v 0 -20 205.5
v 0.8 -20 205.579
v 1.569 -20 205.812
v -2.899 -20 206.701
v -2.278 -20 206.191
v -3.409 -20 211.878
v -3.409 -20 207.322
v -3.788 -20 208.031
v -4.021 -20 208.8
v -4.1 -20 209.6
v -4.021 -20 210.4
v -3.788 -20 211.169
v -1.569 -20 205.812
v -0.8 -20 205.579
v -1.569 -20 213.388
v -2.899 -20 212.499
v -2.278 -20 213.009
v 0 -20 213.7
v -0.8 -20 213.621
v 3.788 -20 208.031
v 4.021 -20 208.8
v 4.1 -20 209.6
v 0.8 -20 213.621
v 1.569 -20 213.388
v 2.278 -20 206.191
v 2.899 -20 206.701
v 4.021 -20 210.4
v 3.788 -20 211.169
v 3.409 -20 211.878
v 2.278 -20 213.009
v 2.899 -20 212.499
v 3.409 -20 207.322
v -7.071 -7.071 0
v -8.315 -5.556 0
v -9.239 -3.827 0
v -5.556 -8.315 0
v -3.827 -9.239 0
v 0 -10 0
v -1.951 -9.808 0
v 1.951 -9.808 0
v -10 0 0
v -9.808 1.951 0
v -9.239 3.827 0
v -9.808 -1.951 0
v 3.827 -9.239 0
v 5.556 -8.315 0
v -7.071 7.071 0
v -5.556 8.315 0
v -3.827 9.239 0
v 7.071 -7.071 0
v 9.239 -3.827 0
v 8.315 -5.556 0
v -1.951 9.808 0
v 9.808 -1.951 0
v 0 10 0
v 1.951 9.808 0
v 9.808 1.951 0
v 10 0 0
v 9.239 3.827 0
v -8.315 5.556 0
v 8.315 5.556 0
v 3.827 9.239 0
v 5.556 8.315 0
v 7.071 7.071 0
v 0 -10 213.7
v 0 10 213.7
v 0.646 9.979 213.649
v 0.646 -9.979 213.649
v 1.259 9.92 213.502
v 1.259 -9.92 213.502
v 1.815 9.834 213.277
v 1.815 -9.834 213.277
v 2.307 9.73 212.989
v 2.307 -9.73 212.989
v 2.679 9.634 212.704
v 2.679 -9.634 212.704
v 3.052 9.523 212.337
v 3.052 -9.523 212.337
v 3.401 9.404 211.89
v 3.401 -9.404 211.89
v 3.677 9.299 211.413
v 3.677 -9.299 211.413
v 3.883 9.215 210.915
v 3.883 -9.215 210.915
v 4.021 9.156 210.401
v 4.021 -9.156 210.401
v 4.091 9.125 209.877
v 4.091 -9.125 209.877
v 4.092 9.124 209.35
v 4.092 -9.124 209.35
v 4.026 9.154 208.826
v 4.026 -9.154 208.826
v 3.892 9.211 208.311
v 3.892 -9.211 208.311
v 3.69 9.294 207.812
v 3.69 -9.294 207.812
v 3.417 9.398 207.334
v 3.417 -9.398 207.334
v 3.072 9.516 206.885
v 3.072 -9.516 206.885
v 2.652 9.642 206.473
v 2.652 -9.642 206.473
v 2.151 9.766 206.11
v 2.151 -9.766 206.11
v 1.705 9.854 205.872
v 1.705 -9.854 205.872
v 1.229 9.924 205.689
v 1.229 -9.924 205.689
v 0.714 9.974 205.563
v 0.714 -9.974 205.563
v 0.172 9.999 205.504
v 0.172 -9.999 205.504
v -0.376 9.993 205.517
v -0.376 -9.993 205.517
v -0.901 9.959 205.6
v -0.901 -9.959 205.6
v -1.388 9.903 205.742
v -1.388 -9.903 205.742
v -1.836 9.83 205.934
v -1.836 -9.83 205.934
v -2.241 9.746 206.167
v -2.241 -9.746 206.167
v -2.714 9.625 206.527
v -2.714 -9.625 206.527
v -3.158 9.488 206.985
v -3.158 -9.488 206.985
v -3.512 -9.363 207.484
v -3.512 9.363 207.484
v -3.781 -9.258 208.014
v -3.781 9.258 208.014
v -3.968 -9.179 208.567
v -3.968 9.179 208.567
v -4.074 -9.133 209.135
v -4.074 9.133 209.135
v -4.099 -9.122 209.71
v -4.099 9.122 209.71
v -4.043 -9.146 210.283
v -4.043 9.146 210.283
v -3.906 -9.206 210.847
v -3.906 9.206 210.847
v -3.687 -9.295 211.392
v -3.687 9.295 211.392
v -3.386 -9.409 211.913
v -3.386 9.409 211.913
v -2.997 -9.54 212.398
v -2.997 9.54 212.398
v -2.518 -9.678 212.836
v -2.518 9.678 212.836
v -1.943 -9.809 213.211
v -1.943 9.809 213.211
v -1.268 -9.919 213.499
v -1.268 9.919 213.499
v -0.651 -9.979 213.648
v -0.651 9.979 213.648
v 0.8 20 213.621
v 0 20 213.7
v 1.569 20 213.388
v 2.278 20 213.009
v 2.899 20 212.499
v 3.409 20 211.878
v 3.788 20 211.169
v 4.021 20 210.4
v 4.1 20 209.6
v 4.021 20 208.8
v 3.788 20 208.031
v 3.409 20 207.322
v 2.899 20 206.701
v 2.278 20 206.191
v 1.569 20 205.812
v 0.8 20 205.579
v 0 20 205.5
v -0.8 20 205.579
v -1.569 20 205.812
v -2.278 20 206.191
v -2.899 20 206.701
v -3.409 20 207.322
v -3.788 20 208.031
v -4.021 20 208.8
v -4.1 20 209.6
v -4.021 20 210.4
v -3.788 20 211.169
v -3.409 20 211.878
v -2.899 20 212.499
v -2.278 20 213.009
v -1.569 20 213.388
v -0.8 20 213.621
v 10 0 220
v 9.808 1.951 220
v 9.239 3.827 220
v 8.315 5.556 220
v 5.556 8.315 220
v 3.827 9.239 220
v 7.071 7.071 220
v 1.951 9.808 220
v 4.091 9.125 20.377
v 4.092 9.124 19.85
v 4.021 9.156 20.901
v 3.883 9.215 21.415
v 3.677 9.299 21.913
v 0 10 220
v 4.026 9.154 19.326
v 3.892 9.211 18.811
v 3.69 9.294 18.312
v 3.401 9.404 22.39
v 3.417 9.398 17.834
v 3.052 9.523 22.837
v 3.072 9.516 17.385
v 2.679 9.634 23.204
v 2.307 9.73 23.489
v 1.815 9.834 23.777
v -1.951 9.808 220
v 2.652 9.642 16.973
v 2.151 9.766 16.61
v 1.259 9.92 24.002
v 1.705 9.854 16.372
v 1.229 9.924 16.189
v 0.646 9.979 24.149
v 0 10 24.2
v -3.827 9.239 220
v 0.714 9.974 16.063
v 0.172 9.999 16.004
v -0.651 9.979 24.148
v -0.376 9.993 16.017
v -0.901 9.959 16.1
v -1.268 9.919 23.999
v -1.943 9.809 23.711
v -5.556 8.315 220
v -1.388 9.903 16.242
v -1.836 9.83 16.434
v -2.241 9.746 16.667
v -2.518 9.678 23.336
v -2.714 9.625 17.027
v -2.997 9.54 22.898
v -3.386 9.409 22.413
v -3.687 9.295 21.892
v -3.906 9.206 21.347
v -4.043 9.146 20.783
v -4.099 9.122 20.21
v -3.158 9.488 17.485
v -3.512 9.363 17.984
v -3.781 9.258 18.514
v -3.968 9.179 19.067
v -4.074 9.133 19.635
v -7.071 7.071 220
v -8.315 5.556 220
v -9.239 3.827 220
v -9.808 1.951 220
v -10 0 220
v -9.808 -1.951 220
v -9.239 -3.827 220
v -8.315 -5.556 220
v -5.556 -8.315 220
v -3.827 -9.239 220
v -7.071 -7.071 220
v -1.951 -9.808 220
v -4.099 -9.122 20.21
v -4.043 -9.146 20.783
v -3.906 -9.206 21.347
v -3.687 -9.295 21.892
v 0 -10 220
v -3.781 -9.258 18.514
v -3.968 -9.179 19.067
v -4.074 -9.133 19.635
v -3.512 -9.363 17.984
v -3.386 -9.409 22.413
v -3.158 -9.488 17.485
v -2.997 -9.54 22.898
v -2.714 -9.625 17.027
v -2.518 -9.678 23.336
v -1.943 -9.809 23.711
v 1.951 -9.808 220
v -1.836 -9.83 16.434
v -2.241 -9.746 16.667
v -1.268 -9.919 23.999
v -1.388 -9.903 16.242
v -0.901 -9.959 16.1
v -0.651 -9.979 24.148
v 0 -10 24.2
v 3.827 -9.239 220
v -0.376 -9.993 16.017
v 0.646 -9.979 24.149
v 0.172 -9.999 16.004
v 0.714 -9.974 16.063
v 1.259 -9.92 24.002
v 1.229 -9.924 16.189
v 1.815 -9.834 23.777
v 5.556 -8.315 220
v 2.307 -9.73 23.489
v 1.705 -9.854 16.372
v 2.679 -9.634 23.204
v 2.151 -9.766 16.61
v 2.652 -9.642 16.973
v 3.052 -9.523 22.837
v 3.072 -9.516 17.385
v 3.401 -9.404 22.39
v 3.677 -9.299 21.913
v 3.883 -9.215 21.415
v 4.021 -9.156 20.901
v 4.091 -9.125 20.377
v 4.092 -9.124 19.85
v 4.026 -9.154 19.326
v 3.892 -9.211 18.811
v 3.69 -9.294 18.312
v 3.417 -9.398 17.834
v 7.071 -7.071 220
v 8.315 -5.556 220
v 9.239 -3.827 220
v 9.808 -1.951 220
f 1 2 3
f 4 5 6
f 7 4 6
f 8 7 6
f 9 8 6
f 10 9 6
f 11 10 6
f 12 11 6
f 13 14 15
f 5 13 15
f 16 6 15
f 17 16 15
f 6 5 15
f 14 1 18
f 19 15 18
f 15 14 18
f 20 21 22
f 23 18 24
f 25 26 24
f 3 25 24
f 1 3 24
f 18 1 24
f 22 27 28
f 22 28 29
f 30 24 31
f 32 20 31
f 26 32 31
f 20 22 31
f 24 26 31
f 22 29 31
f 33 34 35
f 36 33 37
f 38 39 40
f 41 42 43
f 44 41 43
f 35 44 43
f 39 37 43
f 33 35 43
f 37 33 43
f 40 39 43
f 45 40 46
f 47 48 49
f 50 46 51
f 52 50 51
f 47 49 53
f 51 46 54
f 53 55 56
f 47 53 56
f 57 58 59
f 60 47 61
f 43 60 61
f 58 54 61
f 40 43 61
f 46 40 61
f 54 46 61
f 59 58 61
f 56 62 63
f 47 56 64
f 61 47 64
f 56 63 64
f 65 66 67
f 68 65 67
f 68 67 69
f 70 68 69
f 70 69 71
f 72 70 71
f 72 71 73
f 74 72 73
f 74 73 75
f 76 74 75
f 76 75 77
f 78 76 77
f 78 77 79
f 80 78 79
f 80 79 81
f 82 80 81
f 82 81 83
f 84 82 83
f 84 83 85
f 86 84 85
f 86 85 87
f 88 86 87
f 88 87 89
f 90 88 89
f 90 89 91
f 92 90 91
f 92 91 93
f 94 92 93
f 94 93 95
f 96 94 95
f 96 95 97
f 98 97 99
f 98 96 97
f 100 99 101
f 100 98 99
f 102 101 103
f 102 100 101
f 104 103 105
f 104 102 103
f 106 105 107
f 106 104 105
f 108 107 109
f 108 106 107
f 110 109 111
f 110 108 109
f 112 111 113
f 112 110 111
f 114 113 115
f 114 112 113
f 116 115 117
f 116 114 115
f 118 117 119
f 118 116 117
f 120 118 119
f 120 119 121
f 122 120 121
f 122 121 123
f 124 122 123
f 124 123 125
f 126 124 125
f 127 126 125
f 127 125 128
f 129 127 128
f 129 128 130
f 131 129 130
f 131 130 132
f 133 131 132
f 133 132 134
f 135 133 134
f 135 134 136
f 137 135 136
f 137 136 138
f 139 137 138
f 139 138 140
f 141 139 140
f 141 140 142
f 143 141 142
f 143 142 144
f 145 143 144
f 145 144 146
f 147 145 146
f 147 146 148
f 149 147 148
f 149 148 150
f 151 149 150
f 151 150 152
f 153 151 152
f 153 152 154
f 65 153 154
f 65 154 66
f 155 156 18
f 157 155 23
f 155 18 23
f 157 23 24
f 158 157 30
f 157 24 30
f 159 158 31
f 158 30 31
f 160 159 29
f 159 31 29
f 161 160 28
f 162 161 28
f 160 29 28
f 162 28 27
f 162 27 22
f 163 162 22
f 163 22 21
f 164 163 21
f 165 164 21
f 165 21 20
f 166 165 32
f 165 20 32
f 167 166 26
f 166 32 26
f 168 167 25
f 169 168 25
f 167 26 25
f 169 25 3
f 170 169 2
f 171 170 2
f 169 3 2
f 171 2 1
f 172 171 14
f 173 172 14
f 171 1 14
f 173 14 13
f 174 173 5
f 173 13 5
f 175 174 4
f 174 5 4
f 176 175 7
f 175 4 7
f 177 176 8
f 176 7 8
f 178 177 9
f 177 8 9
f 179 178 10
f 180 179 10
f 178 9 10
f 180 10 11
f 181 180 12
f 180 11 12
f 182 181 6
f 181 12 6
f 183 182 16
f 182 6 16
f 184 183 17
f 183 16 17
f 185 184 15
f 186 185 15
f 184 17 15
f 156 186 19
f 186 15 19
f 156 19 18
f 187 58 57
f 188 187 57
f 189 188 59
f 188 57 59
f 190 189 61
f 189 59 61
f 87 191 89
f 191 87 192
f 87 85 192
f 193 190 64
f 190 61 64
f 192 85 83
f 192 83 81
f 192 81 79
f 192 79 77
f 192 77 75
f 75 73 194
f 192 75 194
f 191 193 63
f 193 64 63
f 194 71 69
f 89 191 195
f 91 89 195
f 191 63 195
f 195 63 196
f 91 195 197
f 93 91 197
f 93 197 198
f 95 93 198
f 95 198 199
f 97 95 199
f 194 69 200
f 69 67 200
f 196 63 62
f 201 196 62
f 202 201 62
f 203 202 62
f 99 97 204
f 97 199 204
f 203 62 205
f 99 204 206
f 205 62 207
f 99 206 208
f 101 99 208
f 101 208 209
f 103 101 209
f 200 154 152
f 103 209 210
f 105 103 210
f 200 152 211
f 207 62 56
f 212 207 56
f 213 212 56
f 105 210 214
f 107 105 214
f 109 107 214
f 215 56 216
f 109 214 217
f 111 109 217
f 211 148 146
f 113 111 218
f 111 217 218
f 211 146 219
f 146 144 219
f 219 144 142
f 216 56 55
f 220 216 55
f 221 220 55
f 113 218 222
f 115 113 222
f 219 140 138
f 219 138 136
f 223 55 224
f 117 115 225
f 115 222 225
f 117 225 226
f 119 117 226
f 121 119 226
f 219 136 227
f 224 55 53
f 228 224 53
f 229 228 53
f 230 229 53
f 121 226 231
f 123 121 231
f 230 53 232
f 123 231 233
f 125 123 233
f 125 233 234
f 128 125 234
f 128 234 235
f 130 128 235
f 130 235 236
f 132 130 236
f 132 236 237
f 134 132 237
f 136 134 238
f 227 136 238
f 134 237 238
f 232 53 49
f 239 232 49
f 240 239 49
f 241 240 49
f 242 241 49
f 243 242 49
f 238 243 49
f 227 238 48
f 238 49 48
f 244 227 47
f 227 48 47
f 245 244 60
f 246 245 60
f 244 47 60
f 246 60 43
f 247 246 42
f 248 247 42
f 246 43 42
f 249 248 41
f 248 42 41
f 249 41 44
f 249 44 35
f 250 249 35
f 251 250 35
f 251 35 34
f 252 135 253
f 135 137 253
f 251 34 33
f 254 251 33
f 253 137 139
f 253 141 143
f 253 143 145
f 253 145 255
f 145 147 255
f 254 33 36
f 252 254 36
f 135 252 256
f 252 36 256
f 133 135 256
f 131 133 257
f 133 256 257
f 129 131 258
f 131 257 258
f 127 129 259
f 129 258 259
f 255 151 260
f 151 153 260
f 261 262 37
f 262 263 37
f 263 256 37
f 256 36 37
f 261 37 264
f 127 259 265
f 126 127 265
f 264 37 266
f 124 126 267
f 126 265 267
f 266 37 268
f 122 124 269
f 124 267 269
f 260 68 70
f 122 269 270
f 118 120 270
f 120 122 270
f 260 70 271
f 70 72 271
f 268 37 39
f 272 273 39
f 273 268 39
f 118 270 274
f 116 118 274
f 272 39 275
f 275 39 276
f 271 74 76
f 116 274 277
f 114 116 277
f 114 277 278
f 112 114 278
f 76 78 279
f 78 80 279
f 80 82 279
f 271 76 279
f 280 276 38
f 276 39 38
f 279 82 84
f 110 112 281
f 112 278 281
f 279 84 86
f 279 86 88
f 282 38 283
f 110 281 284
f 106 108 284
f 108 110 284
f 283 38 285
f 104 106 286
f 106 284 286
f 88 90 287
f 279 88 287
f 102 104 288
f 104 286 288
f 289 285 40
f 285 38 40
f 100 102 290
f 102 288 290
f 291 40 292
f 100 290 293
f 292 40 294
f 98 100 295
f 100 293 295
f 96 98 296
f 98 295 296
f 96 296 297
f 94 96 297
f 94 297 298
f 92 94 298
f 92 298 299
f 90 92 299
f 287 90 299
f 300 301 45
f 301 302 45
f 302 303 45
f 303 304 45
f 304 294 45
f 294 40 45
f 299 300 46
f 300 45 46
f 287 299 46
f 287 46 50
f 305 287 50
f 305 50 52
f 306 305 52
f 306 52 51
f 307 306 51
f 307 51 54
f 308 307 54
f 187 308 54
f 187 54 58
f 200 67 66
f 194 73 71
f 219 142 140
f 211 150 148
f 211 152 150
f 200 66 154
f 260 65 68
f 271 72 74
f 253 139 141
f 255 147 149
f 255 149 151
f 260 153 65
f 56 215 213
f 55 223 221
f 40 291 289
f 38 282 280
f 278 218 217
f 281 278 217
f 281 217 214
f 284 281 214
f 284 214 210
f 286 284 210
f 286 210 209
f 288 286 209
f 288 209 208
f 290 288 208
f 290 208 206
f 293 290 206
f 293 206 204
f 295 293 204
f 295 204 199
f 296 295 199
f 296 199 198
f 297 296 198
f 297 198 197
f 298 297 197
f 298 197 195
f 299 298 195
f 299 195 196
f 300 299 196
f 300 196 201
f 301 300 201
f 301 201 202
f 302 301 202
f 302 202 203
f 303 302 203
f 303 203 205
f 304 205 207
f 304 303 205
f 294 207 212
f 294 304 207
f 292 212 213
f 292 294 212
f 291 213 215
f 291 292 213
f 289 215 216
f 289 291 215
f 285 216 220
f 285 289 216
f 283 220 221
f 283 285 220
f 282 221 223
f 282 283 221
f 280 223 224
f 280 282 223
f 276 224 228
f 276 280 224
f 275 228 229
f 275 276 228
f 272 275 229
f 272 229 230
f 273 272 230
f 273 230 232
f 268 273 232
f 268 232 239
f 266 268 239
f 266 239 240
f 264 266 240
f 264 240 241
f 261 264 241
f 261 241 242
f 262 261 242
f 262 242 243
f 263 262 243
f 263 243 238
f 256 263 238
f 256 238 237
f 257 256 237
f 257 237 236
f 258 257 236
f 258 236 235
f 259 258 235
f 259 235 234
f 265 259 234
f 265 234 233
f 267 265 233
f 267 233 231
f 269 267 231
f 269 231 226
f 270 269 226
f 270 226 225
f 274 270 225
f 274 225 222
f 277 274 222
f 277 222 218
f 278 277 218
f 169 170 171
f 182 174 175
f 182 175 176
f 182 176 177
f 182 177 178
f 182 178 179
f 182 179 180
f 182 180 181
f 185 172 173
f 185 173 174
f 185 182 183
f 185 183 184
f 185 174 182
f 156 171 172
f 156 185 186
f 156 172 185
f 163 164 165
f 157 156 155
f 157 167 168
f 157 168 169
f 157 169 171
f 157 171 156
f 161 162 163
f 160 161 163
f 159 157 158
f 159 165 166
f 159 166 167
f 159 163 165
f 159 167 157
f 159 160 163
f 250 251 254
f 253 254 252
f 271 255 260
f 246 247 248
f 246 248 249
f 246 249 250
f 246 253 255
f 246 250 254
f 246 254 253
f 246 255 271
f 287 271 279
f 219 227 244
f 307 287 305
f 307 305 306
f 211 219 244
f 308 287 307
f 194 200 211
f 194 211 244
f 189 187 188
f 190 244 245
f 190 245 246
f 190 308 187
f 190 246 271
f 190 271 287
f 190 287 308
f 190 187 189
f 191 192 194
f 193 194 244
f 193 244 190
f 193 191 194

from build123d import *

# Parameters (mm, degrees)
SKETCH_1_R               = 10
EXTRUDE_1_DEPTH          = 220
CUT_EXTRUDE_1_DEPTH      = 221.45407685
CUT_EXTRUDE_1_DEPTH_BACK = 221.45407685
SKETCH_2_R               = 4.1
EXTRUDE_2_DEPTH          = 20
EXTRUDE_2_DEPTH_BACK     = 20
SKETCH_3_R               = 4.1


with BuildPart() as part:
    # Эскиз1 → Бобышка-Вытянуть1 (new body)
    with BuildSketch(Plane.XY):
        Circle(SKETCH_1_R)
    extrude(amount=EXTRUDE_1_DEPTH)

    # Эскиз2 → Вырез-Вытянуть1 (cut, two sides: drawn at the far end of the back side and taken through both)
    with BuildSketch(Plane(origin=(0, 0, 0), x_dir=(1, 0, 0), z_dir=(0, 1, 0)).offset(-CUT_EXTRUDE_1_DEPTH_BACK)):
        with Locations((0, -20.1)):
            Circle(SKETCH_2_R)
        with Locations((0, -209.6)):
            Circle(SKETCH_2_R)
    extrude(amount=CUT_EXTRUDE_1_DEPTH + CUT_EXTRUDE_1_DEPTH_BACK, mode=Mode.SUBTRACT)


with BuildPart() as body_2:
    # Эскиз3 → Бобышка-Вытянуть2 (new, two sides: drawn at the far end of the back side and taken through both)
    with BuildSketch(Plane(origin=(0, 0, 0), x_dir=(1, 0, 0), z_dir=(0, 1, 0)).offset(-EXTRUDE_2_DEPTH_BACK)):
        with Locations((0, -209.6)):
            Circle(SKETCH_3_R)
    extrude(amount=EXTRUDE_2_DEPTH + EXTRUDE_2_DEPTH_BACK)


solid = Compound([part.part, body_2.part])
